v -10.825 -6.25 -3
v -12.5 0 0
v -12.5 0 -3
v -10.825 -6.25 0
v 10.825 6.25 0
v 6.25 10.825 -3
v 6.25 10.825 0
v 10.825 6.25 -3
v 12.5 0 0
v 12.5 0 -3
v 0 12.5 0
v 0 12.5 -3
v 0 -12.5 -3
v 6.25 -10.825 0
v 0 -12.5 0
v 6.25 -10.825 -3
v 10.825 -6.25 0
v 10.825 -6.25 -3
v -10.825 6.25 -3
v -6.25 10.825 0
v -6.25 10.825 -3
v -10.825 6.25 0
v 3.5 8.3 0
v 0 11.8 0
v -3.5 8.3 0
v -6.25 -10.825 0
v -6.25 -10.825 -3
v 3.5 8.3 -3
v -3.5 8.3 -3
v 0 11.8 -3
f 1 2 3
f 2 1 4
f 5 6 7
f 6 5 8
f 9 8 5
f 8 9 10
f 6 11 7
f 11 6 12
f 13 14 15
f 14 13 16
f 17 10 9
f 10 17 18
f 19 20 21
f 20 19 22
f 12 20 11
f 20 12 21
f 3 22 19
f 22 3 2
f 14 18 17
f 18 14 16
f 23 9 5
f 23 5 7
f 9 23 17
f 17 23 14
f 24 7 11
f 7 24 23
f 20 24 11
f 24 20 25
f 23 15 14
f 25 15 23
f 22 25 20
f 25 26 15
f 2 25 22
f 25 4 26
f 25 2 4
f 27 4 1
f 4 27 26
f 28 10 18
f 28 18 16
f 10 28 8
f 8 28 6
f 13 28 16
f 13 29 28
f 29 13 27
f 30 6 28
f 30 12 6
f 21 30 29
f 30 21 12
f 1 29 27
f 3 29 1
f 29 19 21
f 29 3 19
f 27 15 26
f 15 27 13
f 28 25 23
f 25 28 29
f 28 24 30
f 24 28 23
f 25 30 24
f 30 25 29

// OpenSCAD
$fn=12;

// unit is mm

base_diameter = 25;
base_thickness = 3;
base_arrow_base = 7;

//head_height = 7;


module base() {

  d_2 = base_diameter / 2;
  ab_2 = base_arrow_base / 2;
  t12 = 1.2 * base_thickness;

  translate([ 0, 0, - base_thickness / 2 ])
    difference() {

      // base
      cylinder(d=base_diameter, h=base_thickness, center=true);

      // arrow
      translate([ 0, d_2 - 1.2 * ab_2, -0.5 * t12 ])
        linear_extrude(t12)
          polygon([
            [ -ab_2, 0 ], [ 0, ab_2 ], [ ab_2, 0 ] ]);
    }
}

base();
